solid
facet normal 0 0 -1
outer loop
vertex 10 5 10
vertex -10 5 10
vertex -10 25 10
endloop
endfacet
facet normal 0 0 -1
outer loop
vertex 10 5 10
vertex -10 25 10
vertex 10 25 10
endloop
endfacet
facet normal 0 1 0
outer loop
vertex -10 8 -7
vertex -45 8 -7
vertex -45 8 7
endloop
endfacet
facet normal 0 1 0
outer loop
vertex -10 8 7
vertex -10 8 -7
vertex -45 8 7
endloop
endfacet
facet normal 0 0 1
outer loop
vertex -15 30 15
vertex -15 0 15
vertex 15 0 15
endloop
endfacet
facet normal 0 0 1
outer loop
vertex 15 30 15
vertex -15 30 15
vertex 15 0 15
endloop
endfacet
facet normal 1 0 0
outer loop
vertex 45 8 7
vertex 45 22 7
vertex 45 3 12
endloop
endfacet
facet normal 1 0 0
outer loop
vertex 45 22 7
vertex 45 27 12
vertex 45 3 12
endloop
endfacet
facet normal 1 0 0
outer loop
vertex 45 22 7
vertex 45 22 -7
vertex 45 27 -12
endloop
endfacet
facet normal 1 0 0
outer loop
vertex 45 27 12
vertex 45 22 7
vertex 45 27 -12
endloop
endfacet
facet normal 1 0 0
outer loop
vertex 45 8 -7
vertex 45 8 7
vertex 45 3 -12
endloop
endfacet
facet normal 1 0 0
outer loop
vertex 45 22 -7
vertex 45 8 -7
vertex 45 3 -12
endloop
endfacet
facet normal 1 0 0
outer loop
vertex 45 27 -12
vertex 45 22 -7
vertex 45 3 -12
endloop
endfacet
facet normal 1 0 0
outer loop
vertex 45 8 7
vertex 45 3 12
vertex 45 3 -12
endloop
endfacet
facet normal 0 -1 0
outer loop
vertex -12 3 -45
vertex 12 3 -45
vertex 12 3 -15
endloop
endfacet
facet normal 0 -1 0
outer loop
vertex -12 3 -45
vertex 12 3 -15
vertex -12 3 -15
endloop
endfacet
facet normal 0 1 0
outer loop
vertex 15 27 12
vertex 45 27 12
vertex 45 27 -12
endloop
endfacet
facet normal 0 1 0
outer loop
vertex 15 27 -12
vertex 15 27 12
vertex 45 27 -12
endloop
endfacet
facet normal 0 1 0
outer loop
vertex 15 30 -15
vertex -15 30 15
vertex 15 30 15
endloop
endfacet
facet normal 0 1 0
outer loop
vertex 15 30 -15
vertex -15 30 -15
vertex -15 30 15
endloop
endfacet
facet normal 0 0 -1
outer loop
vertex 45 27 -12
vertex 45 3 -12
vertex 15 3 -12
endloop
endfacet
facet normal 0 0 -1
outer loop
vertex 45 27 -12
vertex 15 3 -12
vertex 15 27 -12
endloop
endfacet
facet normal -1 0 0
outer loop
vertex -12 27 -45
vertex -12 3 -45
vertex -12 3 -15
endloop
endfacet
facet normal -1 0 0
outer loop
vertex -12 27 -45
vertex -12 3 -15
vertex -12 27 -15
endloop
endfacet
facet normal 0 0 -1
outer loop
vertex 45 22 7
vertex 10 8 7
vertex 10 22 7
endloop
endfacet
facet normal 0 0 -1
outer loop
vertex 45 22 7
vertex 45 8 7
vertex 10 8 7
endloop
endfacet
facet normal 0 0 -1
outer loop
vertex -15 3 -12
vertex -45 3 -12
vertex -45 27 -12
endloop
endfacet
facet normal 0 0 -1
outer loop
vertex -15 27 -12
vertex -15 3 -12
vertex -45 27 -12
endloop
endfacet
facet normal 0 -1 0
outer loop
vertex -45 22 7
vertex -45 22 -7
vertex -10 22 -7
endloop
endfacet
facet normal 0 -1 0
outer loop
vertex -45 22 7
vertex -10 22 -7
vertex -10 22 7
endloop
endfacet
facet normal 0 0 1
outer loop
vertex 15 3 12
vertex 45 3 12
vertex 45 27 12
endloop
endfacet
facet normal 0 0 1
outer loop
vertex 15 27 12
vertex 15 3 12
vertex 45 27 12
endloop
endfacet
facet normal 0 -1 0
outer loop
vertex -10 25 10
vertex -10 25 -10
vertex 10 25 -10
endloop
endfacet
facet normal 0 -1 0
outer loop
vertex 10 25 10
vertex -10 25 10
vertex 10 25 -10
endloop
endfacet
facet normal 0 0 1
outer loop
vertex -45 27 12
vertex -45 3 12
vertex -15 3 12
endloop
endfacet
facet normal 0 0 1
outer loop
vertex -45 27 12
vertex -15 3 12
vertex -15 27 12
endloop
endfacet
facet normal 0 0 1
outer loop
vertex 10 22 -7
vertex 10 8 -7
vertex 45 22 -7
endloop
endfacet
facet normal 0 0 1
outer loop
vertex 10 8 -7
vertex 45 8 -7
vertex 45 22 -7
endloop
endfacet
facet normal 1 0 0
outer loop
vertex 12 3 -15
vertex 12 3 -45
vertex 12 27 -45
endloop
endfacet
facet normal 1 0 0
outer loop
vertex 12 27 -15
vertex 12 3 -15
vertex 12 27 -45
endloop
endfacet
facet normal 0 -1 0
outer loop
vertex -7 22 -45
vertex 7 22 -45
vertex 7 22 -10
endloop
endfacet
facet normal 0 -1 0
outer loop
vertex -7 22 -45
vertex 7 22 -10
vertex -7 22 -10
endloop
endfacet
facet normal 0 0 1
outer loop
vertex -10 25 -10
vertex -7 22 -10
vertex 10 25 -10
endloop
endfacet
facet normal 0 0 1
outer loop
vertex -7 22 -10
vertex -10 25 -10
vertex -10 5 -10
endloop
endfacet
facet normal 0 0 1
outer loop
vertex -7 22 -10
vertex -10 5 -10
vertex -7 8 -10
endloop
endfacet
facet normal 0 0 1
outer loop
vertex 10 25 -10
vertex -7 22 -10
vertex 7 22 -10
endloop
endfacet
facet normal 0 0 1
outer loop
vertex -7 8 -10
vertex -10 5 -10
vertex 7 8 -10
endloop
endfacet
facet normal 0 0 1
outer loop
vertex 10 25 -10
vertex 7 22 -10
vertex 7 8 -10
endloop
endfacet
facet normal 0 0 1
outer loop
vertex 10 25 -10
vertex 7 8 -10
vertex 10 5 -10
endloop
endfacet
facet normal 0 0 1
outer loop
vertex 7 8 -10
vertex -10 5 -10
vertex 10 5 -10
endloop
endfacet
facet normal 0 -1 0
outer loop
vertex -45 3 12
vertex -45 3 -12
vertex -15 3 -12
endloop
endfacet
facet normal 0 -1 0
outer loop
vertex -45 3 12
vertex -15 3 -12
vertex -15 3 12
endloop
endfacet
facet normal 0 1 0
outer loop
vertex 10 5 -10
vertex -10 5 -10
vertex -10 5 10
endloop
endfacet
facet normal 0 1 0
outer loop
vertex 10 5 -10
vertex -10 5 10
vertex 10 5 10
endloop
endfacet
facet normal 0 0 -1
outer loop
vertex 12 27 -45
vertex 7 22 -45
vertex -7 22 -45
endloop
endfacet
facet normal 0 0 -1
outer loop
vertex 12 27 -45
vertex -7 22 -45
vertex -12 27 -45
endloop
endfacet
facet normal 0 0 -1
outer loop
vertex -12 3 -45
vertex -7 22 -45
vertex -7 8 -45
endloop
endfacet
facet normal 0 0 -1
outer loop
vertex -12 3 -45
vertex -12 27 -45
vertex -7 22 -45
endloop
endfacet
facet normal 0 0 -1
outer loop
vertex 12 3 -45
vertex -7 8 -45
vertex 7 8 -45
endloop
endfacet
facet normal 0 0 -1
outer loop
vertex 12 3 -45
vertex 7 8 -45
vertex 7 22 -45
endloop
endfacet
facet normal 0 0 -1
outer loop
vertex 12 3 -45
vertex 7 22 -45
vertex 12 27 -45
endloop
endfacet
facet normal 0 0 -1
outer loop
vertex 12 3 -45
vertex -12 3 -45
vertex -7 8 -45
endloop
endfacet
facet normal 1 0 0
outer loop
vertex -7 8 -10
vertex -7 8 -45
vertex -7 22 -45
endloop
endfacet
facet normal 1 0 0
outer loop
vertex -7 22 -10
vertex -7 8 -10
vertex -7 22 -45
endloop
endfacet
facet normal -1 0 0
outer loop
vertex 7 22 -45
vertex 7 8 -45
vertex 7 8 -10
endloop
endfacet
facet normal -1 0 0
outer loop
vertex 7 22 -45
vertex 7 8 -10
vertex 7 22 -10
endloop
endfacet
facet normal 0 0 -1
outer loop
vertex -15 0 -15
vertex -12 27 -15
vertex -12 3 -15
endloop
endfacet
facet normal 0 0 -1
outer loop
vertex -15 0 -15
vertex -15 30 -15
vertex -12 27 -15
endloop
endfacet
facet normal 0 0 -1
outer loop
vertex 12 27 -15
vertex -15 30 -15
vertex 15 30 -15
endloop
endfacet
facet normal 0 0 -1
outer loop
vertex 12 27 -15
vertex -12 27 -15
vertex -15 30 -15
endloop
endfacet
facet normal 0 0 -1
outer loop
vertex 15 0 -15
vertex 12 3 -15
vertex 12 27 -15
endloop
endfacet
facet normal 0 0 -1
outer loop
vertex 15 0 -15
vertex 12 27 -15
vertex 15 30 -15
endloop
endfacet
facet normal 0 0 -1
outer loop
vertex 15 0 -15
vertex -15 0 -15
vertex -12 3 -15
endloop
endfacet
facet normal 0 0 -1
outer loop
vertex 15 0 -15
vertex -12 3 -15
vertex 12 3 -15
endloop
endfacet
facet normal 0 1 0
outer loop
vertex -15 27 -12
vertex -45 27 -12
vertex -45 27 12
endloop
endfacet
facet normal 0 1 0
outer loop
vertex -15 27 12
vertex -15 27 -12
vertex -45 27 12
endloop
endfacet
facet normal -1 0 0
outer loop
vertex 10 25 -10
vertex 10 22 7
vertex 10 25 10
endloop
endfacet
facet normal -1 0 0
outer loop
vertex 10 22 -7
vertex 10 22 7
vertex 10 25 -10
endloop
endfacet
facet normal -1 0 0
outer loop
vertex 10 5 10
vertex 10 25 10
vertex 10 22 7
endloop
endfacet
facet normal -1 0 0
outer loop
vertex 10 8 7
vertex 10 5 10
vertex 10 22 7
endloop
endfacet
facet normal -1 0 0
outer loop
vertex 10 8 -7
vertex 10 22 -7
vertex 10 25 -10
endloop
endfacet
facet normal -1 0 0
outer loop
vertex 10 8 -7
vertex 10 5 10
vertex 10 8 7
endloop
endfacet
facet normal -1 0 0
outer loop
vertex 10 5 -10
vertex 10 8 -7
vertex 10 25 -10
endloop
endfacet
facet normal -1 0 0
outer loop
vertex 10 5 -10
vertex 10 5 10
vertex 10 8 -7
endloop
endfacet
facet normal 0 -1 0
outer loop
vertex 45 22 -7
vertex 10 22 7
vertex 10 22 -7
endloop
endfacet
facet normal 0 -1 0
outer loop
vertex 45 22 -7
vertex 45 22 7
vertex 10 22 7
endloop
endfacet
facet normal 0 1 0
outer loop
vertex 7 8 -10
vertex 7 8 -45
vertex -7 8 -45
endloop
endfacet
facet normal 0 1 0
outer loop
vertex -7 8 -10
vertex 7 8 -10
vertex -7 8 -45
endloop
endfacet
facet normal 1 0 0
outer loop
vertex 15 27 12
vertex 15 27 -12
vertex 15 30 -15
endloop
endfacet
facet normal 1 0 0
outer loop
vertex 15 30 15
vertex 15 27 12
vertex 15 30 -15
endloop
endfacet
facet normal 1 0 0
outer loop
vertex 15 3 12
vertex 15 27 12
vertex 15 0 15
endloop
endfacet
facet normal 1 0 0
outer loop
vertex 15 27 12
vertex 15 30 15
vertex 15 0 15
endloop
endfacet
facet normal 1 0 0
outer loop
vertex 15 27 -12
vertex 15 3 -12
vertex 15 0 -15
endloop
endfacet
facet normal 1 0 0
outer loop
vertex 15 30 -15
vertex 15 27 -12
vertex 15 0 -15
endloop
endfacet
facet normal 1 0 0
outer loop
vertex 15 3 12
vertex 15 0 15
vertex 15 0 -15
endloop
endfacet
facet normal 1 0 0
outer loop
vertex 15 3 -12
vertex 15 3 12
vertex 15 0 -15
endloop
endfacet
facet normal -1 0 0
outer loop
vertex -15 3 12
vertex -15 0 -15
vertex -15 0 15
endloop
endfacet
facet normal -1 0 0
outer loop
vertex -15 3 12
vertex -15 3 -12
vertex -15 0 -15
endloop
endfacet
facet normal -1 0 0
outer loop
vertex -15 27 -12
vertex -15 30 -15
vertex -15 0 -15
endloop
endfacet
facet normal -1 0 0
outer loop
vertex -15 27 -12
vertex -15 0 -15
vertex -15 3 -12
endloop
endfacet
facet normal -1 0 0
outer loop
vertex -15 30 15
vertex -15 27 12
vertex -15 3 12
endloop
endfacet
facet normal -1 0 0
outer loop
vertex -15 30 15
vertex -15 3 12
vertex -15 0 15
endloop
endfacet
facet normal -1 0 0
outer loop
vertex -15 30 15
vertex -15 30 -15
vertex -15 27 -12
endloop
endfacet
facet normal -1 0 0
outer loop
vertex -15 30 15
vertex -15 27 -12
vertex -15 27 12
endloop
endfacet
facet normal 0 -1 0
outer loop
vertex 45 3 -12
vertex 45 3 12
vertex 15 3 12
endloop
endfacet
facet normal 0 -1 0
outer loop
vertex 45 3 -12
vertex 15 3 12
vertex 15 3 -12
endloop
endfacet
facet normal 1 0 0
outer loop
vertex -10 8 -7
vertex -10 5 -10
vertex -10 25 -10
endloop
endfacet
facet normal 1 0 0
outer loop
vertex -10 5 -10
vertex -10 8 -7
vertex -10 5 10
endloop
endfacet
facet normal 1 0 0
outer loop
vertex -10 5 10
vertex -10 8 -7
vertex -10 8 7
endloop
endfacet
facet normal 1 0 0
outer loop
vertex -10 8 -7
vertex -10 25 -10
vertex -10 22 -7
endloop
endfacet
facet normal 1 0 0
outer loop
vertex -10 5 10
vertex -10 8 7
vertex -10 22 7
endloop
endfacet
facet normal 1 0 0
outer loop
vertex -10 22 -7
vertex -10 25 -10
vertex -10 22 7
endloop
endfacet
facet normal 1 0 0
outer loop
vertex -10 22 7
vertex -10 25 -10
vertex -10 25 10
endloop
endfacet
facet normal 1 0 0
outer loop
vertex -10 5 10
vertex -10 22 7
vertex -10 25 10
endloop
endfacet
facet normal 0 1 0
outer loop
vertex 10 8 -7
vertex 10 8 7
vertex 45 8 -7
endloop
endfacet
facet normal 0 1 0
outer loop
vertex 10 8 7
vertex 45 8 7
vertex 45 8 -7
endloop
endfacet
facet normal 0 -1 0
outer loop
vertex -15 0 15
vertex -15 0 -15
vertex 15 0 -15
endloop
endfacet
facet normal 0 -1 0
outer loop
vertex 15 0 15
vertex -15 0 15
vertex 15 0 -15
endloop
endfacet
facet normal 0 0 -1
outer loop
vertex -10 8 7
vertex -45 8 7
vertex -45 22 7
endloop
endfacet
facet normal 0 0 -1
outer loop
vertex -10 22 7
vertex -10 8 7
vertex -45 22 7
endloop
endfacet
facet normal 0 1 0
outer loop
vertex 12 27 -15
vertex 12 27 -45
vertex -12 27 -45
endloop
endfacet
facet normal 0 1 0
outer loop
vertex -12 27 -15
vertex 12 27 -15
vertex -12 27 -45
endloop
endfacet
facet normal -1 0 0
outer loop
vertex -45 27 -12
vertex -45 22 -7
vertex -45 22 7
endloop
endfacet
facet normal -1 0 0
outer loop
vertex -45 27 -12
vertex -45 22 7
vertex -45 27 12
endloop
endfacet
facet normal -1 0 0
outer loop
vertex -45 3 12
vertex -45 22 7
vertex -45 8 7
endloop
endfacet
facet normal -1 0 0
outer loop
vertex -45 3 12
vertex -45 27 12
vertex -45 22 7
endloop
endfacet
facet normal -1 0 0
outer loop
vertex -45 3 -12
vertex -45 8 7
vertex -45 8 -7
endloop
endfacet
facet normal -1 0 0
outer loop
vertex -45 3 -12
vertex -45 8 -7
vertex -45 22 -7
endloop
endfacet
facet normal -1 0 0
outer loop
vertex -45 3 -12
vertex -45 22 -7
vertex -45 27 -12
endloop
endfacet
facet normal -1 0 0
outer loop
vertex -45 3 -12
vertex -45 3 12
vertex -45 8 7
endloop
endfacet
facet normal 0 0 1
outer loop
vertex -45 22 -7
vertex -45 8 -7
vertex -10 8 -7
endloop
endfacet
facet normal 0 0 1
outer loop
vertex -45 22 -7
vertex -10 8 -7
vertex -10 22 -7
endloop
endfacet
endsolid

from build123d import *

# Parameters (mm, degrees)
CROQUIS1_W     = 30
CROQUIS1_H     = 30
EXTRUIR1_DEPTH = 30
CROQUIS2_W     = 30
CROQUIS2_H     = 30
CROQUIS2_W_2   = 24
CROQUIS2_H_2   = 24
EXTRUIR2_DEPTH = 30
CROQUIS3_W     = 30
CROQUIS3_H     = 30
CROQUIS3_W_2   = 24
CROQUIS3_H_2   = 24
EXTRUIR3_DEPTH = 30
CROQUIS5_W     = 30
CROQUIS5_H     = 30
CROQUIS5_W_2   = 24
CROQUIS5_H_2   = 24
EXTRUIR4_DEPTH = 30
VACIADO1_T     = -5


with BuildPart() as part:
    # Croquis1 → Extruir1 (new body)
    with BuildSketch(Plane(origin=(0, 0, 0), x_dir=(1, 0, 0), z_dir=(0, 1, 0))):
        with Locations((0, 30)):
            Rectangle(CROQUIS1_W, CROQUIS1_H)
        Rectangle(CROQUIS1_W, CROQUIS1_H)
        with Locations((30, 0)):
            Rectangle(CROQUIS1_W, CROQUIS1_H)
        with Locations((-30, 0)):
            Rectangle(CROQUIS1_W, CROQUIS1_H)
    extrude(amount=EXTRUIR1_DEPTH)

    # Croquis2 → Extruir2 (cut)
    with BuildSketch(Plane(origin=(45, 0, 0), x_dir=(0, 0, -1), z_dir=(1, 0, 0))):
        with Locations((0, 15)):
            Rectangle(CROQUIS2_W, CROQUIS2_H)
        with Locations((0, 15)):
            Rectangle(CROQUIS2_W_2, CROQUIS2_H_2, mode=Mode.SUBTRACT)
    extrude(amount=-EXTRUIR2_DEPTH, mode=Mode.SUBTRACT)

    # Croquis3 → Extruir3 (cut)
    with BuildSketch(Plane(origin=(0, 0, -45), x_dir=(-1, 0, 0), z_dir=(0, 0, -1))):
        with Locations((0, 15)):
            Rectangle(CROQUIS3_W, CROQUIS3_H)
        with Locations((0, 15)):
            Rectangle(CROQUIS3_W_2, CROQUIS3_H_2, mode=Mode.SUBTRACT)
    extrude(amount=-EXTRUIR3_DEPTH, mode=Mode.SUBTRACT)

    # Croquis5 → Extruir4 (cut)
    with BuildSketch(Plane.ZY.offset(45)):
        with Locations((0, 15)):
            Rectangle(CROQUIS5_W, CROQUIS5_H)
        with Locations((0, 15)):
            Rectangle(CROQUIS5_W_2, CROQUIS5_H_2, mode=Mode.SUBTRACT)
    extrude(amount=-EXTRUIR4_DEPTH, mode=Mode.SUBTRACT)

    # Vaciado1
    vaciado1_openings = [part.faces().sort_by_distance(p)[0] for p in [
        (45, 15, 0),
        (0, 15, -45),
        (-45, 15, 0),
    ]]
    offset(amount=VACIADO1_T, openings=vaciado1_openings, kind=Kind.INTERSECTION)


solid = part.part
